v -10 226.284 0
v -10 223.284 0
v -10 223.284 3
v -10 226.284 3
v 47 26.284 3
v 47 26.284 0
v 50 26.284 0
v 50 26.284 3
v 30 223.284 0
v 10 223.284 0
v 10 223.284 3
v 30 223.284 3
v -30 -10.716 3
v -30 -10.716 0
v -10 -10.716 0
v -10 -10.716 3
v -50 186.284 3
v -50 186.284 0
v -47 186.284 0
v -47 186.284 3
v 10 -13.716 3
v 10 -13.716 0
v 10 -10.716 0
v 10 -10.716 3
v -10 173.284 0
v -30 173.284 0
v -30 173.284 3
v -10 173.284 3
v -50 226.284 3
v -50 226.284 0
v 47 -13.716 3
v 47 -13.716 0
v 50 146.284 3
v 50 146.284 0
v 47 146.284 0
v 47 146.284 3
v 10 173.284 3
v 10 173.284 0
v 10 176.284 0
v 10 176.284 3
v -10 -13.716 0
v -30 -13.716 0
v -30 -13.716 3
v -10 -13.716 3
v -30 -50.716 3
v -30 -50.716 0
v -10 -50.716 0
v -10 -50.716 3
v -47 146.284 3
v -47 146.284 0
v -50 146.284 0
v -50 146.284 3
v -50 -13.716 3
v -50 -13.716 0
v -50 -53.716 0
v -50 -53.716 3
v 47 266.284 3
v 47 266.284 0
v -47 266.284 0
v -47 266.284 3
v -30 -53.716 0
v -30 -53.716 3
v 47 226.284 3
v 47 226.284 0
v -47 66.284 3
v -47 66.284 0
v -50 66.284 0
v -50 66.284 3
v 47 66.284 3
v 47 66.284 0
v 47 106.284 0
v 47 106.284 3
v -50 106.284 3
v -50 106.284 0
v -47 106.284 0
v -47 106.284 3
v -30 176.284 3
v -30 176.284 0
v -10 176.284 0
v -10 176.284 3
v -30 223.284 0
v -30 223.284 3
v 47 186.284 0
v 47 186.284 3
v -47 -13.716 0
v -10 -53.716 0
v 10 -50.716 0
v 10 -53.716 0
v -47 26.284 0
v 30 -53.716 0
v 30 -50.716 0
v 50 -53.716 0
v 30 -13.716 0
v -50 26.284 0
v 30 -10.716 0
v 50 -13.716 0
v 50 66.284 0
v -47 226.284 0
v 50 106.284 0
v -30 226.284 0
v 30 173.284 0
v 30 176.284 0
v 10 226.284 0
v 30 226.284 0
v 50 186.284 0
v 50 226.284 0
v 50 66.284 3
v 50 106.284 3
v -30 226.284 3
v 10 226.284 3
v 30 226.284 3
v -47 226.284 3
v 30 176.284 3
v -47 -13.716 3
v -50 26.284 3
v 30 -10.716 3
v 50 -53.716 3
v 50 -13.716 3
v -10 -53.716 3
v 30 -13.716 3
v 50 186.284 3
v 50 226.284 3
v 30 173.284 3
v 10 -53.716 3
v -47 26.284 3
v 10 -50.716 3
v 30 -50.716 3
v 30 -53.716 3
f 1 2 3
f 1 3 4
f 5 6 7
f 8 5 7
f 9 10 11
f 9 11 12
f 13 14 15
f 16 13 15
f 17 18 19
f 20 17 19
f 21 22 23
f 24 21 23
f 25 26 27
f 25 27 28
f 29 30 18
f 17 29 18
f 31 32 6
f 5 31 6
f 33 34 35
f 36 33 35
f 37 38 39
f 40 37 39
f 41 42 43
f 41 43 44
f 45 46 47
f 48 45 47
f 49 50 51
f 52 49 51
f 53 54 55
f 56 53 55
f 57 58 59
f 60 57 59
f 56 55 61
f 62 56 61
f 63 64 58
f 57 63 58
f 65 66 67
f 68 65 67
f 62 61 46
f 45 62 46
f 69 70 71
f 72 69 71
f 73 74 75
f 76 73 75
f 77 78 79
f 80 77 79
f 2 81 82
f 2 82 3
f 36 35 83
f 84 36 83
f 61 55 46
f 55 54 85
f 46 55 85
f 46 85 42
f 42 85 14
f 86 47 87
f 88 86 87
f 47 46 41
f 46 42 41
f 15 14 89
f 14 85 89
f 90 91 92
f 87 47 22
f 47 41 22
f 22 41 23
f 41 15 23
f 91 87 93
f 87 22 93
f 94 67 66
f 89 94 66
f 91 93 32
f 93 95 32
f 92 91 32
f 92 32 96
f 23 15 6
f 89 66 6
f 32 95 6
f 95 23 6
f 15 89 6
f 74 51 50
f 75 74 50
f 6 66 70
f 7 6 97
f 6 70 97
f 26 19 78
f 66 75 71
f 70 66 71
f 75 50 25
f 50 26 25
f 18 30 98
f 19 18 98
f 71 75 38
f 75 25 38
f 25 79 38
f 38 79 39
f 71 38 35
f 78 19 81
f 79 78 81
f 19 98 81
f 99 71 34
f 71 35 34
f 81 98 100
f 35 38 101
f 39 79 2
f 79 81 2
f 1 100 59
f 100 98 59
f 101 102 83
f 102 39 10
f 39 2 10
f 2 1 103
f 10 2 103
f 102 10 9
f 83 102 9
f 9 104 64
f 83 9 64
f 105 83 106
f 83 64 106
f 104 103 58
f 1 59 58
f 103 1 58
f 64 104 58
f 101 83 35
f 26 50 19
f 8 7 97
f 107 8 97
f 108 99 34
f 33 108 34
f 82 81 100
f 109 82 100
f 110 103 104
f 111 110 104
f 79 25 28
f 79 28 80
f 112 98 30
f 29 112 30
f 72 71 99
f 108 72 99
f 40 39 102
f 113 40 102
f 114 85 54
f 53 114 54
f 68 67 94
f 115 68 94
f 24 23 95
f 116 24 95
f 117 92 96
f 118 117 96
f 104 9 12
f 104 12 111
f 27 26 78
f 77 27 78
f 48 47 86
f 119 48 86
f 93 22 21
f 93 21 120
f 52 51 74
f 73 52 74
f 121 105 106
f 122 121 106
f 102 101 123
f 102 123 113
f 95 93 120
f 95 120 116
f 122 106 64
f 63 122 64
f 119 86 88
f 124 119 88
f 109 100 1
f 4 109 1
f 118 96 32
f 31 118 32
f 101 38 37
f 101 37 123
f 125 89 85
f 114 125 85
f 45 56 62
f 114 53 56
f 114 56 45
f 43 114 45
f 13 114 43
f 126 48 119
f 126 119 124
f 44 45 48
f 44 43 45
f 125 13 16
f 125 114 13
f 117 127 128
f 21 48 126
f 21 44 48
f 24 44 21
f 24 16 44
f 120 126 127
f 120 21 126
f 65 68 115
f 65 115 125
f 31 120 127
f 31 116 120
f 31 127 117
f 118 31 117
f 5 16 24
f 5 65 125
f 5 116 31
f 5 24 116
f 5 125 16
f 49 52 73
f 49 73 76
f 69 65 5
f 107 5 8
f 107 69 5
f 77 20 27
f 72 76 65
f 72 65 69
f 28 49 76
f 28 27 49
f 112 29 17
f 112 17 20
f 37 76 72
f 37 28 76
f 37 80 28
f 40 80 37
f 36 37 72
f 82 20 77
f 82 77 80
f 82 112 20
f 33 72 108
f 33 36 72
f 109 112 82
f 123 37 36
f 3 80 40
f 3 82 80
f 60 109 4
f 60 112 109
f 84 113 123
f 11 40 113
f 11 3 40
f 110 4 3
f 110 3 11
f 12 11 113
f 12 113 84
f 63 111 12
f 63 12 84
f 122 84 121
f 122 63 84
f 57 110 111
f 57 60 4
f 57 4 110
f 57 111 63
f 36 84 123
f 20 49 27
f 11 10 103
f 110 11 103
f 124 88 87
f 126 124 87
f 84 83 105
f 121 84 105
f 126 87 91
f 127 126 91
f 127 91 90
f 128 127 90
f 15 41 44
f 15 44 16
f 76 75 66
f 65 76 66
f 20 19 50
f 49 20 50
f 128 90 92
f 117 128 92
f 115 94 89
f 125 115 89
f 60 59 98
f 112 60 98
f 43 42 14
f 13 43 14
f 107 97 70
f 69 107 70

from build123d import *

# Parameters (mm, degrees)
SKETCH_1_W      = 20
SKETCH_1_H      = 3
EXTRUDE_1_DEPTH = 3


with BuildPart() as part:
    # 草图1 → 凸台-拉伸1 (new body)
    with BuildSketch(Plane.XY):
        Polygon((50, -53.716238765), (50, -13.716238765), (47, -13.716238765), (47, 26.283761235), (50, 26.283761235), (50, 66.283761235), (47, 66.283761235), (47, 106.283761235), (50, 106.283761235), (50, 146.283761235), (47, 146.283761235), (47, 186.283761235), (50, 186.283761235), (50, 226.283761235), (47, 226.283761235), (47, 266.283761235), (-47, 266.283761235), (-47, 226.283761235), (-50, 226.283761235), (-50, 186.283761235), (-47, 186.283761235), (-47, 146.283761235), (-50, 146.283761235), (-50, 106.283761235), (-47, 106.283761235), (-47, 66.283761235), (-50, 66.283761235), (-50, 26.283761235), (-47, 26.283761235), (-47, -13.716238765), (-50, -13.716238765), (-50, -53.716238765), (-30, -53.716238765), (-30, -50.716238765), (-10, -50.716238765), (-10, -53.716238765), (10, -53.716238765), (10, -50.716238765), (30, -50.716238765), (30, -53.716238765), align=None)
        with Locations((-20, -12.216238765)):
            Rectangle(SKETCH_1_W, SKETCH_1_H, mode=Mode.SUBTRACT)
        with Locations((20, -12.216238765)):
            Rectangle(SKETCH_1_W, SKETCH_1_H, mode=Mode.SUBTRACT)
        with Locations((-20, 174.783761235)):
            Rectangle(SKETCH_1_W, SKETCH_1_H, mode=Mode.SUBTRACT)
        with Locations((20, 174.783761235)):
            Rectangle(SKETCH_1_W, SKETCH_1_H, mode=Mode.SUBTRACT)
        with Locations((-20, 224.783761235)):
            Rectangle(SKETCH_1_W, SKETCH_1_H, mode=Mode.SUBTRACT)
        with Locations((20, 224.783761235)):
            Rectangle(SKETCH_1_W, SKETCH_1_H, mode=Mode.SUBTRACT)
    extrude(amount=EXTRUDE_1_DEPTH)


solid = part.part
